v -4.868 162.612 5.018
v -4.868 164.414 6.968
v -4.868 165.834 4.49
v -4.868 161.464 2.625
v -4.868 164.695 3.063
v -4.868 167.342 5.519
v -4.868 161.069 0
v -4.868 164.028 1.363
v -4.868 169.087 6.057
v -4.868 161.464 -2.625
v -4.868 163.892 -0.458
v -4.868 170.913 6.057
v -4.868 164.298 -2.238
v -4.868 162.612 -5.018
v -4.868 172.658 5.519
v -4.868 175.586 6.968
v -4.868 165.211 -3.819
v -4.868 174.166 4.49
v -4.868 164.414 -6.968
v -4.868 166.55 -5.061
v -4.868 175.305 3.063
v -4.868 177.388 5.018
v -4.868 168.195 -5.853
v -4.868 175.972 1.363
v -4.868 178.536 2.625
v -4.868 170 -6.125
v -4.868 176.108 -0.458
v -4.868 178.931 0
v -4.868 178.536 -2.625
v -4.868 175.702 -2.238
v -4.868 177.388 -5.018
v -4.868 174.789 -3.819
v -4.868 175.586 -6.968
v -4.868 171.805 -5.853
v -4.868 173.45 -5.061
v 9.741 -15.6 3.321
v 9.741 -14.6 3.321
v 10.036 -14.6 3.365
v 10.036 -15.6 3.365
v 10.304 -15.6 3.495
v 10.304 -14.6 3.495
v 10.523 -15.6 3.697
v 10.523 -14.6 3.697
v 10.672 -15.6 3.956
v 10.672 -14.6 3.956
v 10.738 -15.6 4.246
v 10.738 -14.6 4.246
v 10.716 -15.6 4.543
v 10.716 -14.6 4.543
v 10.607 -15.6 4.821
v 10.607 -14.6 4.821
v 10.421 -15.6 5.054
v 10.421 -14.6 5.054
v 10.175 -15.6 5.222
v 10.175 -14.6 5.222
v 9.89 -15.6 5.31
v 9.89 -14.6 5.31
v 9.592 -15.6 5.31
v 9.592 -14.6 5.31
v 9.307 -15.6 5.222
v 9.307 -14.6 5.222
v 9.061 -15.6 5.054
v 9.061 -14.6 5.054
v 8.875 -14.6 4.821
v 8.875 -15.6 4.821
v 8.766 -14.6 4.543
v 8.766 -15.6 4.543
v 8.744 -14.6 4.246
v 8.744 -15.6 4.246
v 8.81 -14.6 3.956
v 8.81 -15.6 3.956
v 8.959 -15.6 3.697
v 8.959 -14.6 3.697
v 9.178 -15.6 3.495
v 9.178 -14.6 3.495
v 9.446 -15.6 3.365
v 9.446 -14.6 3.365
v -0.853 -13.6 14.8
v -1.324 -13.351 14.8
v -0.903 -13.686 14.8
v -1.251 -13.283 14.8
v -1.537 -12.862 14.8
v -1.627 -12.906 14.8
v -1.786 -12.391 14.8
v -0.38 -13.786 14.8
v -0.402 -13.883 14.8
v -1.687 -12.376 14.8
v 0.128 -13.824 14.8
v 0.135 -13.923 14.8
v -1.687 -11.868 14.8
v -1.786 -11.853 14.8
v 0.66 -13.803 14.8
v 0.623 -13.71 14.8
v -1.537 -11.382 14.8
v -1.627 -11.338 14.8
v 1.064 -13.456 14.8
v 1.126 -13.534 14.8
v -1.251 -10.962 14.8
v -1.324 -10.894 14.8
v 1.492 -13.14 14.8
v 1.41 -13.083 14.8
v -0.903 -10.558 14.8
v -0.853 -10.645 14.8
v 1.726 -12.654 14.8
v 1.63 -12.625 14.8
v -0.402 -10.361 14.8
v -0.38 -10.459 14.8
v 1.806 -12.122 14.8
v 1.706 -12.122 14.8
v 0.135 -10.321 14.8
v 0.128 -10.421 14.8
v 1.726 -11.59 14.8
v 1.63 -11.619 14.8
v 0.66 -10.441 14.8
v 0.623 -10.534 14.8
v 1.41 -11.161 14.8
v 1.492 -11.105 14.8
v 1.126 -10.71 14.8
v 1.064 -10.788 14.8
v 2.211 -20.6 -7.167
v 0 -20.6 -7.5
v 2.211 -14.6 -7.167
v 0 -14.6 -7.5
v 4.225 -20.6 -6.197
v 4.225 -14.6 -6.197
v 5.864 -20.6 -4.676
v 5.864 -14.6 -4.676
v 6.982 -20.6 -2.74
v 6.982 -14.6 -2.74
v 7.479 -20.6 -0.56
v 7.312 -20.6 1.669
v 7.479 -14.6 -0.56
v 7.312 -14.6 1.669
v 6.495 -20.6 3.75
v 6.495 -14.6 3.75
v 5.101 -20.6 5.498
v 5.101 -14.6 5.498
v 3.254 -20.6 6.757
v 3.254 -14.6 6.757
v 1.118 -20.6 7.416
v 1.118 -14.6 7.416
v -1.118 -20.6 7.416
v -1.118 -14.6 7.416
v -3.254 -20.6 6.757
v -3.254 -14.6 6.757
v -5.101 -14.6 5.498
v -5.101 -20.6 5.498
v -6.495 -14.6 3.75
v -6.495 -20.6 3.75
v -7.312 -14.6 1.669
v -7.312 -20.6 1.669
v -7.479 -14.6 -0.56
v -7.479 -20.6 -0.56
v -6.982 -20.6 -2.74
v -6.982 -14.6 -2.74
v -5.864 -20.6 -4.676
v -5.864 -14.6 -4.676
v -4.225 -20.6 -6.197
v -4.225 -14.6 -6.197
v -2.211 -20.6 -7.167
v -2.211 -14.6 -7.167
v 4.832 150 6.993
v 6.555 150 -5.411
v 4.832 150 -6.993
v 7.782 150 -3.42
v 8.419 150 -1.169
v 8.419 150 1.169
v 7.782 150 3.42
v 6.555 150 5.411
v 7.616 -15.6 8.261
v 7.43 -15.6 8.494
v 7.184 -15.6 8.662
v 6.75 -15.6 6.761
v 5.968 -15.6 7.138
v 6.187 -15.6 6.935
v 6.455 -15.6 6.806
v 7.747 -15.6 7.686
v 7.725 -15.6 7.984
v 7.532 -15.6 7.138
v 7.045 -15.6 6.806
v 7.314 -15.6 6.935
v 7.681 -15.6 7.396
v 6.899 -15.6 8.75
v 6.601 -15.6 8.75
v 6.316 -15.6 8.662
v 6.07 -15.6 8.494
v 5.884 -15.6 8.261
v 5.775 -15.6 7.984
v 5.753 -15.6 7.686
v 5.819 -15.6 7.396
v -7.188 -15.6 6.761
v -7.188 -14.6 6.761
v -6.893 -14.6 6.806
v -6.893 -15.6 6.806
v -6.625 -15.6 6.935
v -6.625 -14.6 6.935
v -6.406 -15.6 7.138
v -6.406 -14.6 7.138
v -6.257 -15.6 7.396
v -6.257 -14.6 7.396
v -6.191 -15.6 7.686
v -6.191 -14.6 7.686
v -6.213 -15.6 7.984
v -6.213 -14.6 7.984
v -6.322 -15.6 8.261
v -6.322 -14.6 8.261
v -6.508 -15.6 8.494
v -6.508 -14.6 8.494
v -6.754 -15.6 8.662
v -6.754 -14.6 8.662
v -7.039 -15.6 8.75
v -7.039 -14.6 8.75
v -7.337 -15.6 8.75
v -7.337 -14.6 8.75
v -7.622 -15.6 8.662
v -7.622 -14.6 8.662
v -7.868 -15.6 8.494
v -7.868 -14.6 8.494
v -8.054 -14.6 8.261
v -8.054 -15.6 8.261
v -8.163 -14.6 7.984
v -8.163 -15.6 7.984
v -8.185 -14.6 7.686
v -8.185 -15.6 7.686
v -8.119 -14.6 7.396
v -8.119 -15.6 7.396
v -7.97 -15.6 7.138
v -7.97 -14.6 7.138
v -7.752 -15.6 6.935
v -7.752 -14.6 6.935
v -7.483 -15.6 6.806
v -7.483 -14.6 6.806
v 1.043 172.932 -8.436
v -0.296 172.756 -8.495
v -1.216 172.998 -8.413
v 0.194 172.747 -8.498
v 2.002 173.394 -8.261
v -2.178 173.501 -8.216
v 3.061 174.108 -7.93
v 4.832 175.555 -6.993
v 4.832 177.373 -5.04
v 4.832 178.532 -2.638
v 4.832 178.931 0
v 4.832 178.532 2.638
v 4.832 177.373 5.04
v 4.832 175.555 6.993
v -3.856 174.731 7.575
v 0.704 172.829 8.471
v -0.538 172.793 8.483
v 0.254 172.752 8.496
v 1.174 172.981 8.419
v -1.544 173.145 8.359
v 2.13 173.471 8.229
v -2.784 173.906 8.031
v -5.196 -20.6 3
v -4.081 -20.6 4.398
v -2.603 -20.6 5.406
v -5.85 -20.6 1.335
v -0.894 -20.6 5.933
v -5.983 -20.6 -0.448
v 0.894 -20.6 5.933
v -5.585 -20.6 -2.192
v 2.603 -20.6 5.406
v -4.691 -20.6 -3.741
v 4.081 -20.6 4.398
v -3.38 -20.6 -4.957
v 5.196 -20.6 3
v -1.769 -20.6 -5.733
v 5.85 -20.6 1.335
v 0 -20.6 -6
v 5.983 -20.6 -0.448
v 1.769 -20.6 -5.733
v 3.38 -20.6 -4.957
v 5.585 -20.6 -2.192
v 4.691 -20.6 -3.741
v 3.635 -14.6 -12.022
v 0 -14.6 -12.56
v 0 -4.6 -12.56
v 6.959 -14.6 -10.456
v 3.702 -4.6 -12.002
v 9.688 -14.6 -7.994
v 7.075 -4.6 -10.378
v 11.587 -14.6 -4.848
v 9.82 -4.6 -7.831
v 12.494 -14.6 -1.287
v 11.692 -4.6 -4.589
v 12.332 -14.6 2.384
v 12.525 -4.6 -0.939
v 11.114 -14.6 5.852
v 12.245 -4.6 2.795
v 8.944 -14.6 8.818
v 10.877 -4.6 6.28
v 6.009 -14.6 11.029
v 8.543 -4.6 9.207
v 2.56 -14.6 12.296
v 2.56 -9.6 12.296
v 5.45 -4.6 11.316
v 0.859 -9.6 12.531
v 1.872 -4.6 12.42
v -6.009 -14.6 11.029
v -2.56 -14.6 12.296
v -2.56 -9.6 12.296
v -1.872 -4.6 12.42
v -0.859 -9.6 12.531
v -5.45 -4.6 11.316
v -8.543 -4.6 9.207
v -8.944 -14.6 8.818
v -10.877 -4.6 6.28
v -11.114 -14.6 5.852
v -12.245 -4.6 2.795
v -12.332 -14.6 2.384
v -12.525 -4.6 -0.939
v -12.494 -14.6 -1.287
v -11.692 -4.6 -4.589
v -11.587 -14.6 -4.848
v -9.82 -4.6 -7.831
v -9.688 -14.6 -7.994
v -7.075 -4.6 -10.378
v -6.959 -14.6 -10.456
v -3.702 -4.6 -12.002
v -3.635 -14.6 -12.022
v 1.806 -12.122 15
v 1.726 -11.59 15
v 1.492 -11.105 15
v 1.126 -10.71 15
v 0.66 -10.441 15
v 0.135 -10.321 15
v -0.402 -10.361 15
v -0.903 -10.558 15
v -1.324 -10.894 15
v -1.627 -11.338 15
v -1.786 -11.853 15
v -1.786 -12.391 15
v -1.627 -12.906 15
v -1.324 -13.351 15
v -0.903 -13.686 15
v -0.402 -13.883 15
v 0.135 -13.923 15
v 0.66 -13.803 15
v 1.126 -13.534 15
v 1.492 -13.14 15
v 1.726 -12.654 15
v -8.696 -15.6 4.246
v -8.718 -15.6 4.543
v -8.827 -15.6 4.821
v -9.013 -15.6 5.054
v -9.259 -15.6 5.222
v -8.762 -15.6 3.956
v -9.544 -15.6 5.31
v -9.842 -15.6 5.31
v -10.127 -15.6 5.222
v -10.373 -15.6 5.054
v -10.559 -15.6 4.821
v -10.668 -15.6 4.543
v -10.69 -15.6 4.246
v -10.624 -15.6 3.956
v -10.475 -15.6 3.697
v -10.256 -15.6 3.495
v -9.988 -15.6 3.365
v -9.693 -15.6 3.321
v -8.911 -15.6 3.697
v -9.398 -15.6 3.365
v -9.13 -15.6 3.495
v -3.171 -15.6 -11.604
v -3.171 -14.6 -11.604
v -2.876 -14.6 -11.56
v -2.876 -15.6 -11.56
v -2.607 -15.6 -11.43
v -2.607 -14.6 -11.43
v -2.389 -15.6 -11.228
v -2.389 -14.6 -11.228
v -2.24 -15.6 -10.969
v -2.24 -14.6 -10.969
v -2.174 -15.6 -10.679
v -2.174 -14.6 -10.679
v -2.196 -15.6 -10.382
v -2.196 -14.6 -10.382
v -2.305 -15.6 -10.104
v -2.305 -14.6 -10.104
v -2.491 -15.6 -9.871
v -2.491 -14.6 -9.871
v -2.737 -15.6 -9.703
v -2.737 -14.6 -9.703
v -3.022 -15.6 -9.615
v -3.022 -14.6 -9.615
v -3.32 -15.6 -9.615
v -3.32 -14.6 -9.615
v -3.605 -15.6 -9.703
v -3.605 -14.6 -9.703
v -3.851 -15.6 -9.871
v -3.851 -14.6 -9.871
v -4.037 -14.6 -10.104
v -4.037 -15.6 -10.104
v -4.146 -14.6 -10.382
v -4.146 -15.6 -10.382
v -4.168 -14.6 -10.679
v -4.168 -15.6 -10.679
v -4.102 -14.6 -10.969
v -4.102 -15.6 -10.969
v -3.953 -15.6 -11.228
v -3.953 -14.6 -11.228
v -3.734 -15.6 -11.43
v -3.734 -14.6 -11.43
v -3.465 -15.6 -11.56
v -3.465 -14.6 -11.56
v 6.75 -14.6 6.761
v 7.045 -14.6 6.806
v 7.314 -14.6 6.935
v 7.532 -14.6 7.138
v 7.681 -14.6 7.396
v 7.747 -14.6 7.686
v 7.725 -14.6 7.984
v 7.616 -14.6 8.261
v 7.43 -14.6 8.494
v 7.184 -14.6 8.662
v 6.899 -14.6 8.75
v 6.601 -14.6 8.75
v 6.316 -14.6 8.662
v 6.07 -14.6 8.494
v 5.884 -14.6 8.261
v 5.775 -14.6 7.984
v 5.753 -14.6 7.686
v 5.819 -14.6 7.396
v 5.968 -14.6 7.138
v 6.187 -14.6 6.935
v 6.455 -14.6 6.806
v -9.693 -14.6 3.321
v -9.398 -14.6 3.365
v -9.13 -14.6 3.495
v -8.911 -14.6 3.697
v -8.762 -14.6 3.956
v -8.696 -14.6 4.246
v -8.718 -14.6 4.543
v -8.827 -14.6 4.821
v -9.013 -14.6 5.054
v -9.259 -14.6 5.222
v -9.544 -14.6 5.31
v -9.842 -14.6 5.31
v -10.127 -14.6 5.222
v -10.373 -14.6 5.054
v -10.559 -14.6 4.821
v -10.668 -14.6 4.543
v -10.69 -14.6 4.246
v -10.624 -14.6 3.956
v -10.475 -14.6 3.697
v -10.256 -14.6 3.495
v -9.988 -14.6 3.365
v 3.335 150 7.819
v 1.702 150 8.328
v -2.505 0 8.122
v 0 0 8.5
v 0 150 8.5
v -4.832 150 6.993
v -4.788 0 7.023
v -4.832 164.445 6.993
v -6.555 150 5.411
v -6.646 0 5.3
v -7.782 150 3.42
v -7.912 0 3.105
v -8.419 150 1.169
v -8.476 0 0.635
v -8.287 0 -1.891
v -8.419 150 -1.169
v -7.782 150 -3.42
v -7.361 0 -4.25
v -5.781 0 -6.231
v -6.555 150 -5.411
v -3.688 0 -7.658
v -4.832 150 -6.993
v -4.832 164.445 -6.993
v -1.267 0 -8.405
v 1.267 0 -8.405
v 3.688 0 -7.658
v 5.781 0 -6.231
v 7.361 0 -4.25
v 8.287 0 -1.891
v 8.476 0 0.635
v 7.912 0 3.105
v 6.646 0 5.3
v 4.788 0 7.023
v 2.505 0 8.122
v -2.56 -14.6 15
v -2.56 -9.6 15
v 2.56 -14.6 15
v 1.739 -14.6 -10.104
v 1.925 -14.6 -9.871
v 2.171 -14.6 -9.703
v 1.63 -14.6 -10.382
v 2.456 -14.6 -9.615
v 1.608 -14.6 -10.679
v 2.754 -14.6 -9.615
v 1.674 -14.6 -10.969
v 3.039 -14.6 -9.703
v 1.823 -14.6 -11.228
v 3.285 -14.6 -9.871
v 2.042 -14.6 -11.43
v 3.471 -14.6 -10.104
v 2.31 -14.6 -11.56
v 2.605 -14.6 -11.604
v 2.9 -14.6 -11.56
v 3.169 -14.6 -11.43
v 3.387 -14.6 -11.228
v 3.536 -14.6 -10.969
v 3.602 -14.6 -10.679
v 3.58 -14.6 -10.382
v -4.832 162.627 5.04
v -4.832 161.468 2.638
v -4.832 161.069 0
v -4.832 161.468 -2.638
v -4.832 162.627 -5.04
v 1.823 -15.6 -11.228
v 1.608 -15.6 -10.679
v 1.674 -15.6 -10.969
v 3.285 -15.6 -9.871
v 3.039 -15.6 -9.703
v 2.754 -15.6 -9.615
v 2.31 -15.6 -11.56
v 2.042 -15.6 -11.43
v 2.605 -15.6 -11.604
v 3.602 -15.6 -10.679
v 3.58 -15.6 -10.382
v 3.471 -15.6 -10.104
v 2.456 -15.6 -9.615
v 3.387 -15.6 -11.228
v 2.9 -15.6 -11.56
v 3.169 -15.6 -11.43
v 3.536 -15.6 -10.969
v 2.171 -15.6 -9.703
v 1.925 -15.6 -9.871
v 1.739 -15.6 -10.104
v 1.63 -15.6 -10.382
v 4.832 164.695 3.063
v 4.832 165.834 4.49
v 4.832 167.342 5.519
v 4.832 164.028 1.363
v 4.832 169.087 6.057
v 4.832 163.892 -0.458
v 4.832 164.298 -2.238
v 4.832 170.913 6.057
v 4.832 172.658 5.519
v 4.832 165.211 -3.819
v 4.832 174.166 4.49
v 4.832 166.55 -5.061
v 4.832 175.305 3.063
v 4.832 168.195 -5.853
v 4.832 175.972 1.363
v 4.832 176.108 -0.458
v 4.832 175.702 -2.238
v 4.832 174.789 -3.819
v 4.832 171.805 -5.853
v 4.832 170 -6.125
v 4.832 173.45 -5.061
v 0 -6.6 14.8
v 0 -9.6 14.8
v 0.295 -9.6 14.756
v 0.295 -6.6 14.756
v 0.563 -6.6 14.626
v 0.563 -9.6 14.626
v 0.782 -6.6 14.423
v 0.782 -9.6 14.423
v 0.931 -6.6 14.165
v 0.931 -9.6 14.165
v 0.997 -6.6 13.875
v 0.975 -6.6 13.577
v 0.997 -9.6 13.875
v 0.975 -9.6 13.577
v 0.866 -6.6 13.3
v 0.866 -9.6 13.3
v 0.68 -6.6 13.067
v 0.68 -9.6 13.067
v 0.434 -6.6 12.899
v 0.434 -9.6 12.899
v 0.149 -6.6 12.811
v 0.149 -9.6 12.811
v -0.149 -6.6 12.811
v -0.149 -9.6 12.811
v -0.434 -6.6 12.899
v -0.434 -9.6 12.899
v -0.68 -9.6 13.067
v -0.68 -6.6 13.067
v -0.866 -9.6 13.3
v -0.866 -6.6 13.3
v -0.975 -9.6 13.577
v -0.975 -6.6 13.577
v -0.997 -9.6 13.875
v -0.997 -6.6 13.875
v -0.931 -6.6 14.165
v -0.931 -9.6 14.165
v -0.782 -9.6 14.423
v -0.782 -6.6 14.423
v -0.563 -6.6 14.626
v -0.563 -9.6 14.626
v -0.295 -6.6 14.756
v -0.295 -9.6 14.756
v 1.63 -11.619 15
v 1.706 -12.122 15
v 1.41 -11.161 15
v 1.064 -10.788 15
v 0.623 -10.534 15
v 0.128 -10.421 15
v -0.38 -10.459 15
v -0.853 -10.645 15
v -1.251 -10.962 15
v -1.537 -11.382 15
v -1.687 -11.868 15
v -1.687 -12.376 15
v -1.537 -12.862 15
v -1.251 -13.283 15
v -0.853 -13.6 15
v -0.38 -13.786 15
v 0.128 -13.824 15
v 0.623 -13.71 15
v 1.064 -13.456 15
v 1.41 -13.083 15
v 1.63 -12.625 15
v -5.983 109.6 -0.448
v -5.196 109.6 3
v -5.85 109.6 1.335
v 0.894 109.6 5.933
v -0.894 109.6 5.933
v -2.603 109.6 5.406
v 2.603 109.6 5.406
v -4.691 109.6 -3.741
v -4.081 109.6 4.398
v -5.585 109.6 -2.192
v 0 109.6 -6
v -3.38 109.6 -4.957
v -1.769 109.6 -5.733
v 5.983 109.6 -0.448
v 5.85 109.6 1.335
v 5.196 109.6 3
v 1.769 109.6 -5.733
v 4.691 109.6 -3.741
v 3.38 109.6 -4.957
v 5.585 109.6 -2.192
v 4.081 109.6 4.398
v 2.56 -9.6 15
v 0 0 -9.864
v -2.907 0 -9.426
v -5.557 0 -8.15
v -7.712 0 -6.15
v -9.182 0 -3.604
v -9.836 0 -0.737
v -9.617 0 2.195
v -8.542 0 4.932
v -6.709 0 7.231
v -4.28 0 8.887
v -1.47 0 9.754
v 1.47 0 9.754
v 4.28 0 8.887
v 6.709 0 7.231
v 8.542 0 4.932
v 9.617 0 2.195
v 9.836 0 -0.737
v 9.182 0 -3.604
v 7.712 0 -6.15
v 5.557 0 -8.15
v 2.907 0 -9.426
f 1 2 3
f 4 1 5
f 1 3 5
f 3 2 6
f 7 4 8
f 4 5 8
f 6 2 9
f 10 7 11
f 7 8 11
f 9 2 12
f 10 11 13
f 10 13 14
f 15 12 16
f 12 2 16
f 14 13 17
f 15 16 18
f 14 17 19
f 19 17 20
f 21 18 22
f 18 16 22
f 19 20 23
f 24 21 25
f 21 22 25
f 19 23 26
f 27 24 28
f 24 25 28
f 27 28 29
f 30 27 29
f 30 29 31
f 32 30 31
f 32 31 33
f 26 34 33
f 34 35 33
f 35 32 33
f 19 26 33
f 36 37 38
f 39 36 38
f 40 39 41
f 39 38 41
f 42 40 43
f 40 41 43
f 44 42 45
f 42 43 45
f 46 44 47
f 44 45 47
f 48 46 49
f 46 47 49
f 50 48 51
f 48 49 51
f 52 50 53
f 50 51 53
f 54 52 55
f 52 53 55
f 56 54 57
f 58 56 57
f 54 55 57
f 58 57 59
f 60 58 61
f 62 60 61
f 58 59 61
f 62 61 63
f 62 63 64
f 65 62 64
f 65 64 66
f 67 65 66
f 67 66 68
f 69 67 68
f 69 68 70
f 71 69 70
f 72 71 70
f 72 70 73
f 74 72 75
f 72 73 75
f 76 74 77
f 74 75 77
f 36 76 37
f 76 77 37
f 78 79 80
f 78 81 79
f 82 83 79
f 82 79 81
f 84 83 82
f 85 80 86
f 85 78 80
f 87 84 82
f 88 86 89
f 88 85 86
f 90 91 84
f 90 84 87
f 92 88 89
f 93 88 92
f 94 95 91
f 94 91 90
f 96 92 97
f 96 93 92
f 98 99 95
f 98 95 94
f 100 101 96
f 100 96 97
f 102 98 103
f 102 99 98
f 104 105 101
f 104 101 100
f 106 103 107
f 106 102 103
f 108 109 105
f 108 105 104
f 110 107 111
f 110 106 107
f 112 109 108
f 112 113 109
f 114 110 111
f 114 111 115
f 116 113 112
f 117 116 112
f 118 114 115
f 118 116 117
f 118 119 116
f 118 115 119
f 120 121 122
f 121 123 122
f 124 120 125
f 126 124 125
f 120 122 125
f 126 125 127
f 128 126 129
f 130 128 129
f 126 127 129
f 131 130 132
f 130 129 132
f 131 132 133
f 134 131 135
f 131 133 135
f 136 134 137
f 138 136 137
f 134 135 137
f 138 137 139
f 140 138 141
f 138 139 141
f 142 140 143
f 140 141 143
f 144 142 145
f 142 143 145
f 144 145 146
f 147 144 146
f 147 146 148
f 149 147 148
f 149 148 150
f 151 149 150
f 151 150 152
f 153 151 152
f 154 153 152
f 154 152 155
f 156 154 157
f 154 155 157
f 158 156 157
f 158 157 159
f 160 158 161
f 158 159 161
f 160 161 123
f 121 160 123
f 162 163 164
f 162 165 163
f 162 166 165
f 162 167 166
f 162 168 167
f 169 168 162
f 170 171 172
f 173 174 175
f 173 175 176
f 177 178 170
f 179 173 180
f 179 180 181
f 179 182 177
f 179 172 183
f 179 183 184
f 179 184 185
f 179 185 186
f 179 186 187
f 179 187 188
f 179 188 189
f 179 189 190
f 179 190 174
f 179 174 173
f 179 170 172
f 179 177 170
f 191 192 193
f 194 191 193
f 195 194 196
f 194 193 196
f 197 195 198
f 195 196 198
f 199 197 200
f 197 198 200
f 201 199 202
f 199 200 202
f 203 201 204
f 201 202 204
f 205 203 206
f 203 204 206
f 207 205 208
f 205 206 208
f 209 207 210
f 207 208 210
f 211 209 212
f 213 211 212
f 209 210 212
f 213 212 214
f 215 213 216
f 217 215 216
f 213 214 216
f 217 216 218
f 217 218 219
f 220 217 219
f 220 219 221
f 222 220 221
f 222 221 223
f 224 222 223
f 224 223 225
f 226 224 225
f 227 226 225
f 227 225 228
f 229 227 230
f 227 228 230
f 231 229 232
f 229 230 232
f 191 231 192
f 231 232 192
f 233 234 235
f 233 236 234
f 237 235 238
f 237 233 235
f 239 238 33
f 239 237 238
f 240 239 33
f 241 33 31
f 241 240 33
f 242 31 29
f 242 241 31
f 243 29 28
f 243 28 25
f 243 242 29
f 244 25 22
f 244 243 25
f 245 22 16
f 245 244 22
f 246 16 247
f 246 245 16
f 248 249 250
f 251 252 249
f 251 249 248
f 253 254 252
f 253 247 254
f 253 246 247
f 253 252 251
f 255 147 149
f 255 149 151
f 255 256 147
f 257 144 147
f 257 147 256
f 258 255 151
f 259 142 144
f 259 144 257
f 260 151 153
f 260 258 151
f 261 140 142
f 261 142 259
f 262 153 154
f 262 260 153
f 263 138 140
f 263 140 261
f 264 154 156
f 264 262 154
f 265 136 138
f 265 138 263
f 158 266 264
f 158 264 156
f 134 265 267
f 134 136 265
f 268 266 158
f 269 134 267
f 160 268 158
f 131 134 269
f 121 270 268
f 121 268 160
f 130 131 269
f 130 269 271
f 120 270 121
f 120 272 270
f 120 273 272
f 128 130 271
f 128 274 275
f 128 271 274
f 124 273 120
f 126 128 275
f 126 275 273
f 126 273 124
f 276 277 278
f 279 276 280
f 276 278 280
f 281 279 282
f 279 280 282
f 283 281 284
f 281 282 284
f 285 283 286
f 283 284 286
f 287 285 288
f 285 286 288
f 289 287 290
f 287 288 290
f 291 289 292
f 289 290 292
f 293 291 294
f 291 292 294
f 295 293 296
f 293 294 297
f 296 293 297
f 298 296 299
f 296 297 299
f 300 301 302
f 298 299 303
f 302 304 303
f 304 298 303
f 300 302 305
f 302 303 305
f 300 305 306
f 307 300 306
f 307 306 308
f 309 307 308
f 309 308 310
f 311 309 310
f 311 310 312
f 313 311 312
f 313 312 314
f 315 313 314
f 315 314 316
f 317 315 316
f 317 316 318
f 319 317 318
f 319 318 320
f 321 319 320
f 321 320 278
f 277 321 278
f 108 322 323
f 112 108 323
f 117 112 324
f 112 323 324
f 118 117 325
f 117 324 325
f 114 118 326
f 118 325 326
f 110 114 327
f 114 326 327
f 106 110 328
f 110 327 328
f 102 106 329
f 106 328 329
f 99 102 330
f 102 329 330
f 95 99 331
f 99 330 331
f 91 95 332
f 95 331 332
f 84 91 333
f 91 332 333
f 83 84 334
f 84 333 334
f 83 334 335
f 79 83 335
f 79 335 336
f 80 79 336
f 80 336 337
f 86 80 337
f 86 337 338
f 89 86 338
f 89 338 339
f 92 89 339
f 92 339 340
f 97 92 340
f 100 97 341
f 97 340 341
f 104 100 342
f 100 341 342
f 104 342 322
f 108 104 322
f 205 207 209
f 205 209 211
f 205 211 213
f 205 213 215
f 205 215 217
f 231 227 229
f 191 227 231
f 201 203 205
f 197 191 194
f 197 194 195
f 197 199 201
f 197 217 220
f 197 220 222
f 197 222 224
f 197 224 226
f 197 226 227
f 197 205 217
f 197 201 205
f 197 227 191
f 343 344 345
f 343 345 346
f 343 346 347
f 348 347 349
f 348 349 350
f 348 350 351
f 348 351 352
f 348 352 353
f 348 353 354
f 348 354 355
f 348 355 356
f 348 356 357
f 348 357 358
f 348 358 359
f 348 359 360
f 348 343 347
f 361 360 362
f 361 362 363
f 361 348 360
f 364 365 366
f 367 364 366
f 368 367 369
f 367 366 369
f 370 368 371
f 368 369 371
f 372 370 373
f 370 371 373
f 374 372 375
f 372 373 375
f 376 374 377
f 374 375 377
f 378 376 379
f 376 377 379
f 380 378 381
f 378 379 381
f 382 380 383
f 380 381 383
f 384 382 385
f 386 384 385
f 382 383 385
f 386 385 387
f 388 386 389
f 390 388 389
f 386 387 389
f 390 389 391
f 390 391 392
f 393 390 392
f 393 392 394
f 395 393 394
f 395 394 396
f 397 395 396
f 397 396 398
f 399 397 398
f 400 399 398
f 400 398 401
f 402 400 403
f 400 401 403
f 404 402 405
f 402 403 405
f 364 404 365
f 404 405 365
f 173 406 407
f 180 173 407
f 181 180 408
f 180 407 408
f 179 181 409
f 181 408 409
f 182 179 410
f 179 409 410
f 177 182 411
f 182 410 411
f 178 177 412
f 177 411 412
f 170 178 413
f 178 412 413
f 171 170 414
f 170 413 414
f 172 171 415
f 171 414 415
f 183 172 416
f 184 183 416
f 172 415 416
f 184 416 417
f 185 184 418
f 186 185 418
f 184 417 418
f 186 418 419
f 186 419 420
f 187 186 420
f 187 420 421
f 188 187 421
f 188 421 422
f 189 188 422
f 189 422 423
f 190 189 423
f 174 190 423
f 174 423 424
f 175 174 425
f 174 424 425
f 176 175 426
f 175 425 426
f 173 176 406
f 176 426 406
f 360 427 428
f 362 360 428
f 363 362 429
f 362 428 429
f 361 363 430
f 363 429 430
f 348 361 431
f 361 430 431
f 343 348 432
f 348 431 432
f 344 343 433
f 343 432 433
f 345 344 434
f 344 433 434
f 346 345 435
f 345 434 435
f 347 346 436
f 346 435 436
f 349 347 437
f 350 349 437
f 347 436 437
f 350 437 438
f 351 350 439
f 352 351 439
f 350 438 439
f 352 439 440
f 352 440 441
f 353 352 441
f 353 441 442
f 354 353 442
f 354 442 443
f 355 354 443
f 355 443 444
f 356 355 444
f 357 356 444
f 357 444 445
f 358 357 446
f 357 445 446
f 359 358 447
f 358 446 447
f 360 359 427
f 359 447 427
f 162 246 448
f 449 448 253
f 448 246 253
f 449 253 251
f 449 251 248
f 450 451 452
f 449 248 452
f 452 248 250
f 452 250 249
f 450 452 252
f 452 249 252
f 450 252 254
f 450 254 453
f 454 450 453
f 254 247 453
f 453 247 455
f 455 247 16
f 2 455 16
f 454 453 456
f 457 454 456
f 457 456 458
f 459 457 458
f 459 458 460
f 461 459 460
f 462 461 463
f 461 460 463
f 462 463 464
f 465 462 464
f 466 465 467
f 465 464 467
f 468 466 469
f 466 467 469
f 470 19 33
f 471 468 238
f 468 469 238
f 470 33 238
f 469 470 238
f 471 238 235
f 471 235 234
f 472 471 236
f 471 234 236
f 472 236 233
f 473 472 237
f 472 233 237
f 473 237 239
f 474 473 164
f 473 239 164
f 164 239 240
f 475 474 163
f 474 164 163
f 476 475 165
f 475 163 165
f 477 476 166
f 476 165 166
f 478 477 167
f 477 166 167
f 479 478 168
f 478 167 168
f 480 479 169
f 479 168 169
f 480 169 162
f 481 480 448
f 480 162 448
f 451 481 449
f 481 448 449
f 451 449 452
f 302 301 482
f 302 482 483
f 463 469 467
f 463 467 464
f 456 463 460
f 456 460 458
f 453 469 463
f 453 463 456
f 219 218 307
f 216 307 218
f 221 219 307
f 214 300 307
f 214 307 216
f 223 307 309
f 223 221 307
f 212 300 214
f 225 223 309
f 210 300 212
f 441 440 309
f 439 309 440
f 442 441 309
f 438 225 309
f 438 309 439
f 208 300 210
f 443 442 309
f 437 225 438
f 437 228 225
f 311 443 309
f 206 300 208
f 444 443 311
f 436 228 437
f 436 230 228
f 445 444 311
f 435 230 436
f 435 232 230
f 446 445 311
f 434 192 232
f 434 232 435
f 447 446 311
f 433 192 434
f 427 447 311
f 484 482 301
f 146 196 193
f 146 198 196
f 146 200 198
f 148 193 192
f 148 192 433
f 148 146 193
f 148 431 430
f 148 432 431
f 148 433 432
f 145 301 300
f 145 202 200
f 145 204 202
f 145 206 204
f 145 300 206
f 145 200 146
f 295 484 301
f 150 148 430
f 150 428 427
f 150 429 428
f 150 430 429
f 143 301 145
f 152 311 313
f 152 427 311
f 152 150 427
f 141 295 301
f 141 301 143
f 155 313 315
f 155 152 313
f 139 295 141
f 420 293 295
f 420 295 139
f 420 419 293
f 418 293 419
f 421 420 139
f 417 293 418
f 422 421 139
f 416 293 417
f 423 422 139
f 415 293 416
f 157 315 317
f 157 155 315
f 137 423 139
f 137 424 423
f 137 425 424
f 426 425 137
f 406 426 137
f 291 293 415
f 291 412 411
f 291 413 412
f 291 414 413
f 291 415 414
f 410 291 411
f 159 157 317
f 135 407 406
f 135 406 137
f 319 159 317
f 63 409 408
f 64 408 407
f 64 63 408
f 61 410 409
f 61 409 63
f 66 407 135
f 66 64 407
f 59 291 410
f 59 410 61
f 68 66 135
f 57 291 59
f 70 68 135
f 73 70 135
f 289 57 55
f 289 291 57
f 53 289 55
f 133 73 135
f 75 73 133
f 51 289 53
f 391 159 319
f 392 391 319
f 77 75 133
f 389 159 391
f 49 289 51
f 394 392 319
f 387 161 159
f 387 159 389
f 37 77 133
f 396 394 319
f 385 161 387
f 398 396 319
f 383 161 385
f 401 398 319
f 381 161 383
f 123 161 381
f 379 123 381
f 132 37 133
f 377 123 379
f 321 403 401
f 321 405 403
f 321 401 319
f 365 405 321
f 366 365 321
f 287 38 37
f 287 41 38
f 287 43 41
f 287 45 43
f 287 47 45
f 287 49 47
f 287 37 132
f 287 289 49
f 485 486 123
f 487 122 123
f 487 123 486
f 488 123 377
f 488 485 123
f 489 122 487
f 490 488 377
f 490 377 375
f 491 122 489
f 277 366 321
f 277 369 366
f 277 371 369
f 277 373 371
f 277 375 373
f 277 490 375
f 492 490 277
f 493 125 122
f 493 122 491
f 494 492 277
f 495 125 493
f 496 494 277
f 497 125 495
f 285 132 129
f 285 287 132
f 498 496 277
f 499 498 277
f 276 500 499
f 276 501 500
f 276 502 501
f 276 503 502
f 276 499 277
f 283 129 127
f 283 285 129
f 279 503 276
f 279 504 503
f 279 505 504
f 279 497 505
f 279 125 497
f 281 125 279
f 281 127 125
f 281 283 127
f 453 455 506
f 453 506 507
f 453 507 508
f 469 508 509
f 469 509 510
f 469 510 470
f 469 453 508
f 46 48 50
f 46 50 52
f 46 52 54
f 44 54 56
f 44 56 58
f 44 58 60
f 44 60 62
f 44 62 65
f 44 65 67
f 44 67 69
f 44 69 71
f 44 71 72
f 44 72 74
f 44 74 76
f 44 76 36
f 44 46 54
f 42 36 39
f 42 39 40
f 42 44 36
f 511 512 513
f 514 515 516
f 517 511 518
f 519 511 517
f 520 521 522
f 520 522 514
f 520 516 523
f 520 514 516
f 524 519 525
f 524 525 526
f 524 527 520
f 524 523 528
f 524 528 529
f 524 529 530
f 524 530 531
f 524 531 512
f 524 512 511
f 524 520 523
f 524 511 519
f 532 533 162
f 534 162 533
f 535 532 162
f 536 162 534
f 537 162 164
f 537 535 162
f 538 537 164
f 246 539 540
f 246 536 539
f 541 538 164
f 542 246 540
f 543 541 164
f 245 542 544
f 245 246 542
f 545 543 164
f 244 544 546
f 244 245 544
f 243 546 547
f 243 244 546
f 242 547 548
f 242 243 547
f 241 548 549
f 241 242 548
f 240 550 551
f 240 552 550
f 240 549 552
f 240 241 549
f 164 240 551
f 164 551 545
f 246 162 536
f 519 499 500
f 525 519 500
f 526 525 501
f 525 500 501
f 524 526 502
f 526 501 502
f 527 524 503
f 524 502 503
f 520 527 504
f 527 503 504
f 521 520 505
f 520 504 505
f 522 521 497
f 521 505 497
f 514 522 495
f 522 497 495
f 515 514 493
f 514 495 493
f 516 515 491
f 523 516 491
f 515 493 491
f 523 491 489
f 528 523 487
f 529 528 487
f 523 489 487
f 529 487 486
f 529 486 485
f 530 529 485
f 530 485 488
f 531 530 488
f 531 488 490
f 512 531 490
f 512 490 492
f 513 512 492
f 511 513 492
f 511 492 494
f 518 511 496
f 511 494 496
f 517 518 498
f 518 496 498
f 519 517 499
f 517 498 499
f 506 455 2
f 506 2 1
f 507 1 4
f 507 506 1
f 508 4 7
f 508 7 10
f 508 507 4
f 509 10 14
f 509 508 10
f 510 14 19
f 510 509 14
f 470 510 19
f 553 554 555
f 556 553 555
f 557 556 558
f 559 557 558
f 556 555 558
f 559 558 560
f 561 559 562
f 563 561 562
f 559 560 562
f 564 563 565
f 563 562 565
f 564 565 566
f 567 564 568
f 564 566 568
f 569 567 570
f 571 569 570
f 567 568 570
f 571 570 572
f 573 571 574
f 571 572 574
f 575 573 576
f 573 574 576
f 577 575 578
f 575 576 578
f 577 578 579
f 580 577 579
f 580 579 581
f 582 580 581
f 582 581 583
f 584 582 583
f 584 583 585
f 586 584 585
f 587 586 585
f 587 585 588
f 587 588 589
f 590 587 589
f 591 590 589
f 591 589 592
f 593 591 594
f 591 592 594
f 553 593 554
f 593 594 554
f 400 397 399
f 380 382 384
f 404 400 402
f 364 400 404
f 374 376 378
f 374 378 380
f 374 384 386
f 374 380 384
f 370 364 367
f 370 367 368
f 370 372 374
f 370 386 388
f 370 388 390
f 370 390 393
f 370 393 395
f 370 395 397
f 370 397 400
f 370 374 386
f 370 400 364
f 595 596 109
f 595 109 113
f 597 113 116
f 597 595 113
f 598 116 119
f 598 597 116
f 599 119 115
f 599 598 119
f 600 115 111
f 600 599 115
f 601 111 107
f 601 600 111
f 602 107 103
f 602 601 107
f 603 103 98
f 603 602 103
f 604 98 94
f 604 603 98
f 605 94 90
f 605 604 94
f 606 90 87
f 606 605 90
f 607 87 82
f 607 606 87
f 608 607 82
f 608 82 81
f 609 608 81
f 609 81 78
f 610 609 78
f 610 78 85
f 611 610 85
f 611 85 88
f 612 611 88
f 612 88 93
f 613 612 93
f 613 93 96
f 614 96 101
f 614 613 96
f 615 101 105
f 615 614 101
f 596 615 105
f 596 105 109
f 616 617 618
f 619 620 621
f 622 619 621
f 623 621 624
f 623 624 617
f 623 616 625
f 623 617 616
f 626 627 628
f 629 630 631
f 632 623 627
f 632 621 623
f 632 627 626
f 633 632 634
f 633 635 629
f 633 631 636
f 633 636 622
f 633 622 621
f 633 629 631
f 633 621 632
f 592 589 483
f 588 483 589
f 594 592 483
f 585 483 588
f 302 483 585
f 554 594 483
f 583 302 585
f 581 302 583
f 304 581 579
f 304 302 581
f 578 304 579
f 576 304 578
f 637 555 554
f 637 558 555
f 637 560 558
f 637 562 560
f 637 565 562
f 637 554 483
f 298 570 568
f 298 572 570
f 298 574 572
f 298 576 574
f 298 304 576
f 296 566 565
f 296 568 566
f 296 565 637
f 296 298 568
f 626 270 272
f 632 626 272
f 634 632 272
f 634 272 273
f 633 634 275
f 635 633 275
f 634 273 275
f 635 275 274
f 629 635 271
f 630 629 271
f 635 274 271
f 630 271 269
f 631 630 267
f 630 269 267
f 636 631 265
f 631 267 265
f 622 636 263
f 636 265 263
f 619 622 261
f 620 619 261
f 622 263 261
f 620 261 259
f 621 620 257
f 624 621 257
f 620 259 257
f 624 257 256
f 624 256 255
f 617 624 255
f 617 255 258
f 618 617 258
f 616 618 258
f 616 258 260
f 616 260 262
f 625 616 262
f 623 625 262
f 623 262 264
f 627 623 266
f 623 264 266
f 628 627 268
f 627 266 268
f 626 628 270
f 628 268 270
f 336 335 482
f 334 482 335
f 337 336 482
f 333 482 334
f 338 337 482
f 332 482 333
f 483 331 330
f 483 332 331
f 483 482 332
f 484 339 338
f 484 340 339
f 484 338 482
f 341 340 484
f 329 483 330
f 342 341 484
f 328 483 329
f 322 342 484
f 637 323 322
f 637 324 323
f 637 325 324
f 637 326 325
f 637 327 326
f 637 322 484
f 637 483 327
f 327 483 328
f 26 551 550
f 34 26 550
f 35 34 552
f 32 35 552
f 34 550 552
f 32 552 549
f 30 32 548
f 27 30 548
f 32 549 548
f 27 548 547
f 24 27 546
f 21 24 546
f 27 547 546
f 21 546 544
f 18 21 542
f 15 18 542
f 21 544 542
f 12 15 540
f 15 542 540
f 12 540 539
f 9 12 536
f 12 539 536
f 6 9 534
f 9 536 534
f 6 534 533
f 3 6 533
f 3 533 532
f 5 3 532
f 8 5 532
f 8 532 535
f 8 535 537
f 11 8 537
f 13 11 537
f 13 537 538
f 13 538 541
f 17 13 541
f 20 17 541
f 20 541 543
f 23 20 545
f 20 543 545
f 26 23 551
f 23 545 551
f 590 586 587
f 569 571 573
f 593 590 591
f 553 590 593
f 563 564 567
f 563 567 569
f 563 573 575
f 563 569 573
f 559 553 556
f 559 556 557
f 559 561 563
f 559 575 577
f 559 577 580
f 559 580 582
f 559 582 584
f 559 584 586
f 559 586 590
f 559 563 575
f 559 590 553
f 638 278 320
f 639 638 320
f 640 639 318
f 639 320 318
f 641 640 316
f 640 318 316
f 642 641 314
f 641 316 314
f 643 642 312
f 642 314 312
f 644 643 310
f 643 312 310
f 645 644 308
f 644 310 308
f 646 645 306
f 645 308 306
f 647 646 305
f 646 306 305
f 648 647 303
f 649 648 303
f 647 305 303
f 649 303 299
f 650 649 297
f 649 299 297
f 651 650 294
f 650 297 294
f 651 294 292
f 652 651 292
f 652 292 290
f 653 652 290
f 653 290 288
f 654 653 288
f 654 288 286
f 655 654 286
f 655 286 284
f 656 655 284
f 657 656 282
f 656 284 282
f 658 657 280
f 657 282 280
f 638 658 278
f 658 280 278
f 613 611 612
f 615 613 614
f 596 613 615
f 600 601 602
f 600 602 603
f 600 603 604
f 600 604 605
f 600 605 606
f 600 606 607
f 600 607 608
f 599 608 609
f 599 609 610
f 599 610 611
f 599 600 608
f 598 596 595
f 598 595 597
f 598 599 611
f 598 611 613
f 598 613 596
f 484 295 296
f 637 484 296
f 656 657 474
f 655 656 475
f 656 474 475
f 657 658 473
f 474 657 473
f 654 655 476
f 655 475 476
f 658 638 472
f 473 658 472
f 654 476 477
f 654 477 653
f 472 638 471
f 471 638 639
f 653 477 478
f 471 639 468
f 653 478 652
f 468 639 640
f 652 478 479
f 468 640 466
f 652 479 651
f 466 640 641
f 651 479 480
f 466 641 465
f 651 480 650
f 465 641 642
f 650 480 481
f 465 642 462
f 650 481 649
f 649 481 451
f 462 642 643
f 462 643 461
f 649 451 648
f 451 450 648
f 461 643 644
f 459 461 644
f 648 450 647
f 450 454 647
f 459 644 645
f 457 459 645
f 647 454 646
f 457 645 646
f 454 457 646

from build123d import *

# Parameters (mm, degrees)
SKETCH_1_R               = 8.5
EXTRUDE_1_DEPTH          = 150
SKETCH_2_W               = 9.66465271
SKETCH_2_H               = 17.929973808
EXTRUDE_2_DEPTH          = 20
SKETCH_3_R               = 8.930825741
EXTRUDE_3_DEPTH          = 9.7
SKETCH_4_R               = 6.125222913
CUT_EXTRUDE_1_DEPTH      = 9.7
CUT_EXTRUDE_2_DEPTH      = 180.35679912
CUT_EXTRUDE_2_DEPTH_BACK = 180.35679912
SKETCH_5_R               = 18.5
SKETCH_5_R_2             = 8.5
SKETCH_10_R              = 12.560047034
EXTRUDE_5_DEPTH          = 10
SKETCH_11_R              = 7.5
SKETCH_11_R_2            = 1
EXTRUDE_6_DEPTH          = 1
SKETCH_12_R              = 7.5
EXTRUDE_7_DEPTH          = 5
EXTRUDE_8_DEPTH          = 2
EXTRUDE_8_DEPTH_BACK     = 1
SKETCH_13_W              = 5.120094068
SKETCH_13_H              = 5
SKETCH_14_R              = 1
EXTRUDE_9_DEPTH          = 3
SKETCH_15_R              = 1.806178817
SKETCH_15_R_2            = 1.706178817
CUT_EXTRUDE_3_DEPTH      = 0.2
SKETCH_16_R              = 6
CUT_EXTRUDE_2_2_DEPTH    = 130.2


with BuildPart() as part:
    # 草圖1 → 填料-伸長1 (new body)
    with BuildSketch(Plane(origin=(0, 0, 0), x_dir=(1, 0, 0), z_dir=(0, 1, 0))):
        with Locations(Location((0, 0, 0), (0, 0, 270))):
            Circle(SKETCH_1_R)
    extrude(amount=EXTRUDE_1_DEPTH)

    # 草圖2 → 填料-伸長2 (add)
    with BuildSketch(Plane(origin=(0, 150, 0), x_dir=(1, 0, 0), z_dir=(0, 1, 0))):
        Rectangle(SKETCH_2_W, SKETCH_2_H)
    extrude(amount=EXTRUDE_2_DEPTH)

    # 草圖3 → 填料-伸長3 (add)
    with BuildSketch(Plane(origin=(4.832326355, 0, 0), x_dir=(0, 0, -1), z_dir=(1, 0, 0))):
        with Locations((0, 170)):
            Circle(SKETCH_3_R)
    extrude(amount=-EXTRUDE_3_DEPTH)

    # 草圖4 → 除料-伸長1 (cut)
    with BuildSketch(Plane(origin=(4.832326355, 0, 0), x_dir=(0, 0, -1), z_dir=(1, 0, 0))):
        with Locations((0, 170)):
            Circle(SKETCH_4_R)
    extrude(amount=-CUT_EXTRUDE_1_DEPTH, mode=Mode.SUBTRACT)

    # 草圖5 → Cut-Extrude 2 (cut, two sides: drawn at the far end of the back side and taken through both)
    with BuildSketch(Plane.XZ.offset(-CUT_EXTRUDE_2_DEPTH_BACK)):
        Circle(SKETCH_5_R)
        Circle(SKETCH_5_R_2, mode=Mode.SUBTRACT)
    extrude(amount=CUT_EXTRUDE_2_DEPTH + CUT_EXTRUDE_2_DEPTH_BACK, mode=Mode.SUBTRACT)

    # 草圖9 → 旋轉3 (revolve)
    with BuildSketch(Plane(origin=(0, 0, 0), x_dir=(0, 0, -1), z_dir=(1, 0, 0)), mode=Mode.PRIVATE) as revolve_3_sk:
        Polygon((0, 0), (-9.863847944, 0), (-12.560047034, -4.59966966), (0, -4.59966966), align=None)
    revolve(revolve_3_sk.sketch.rotate(Axis((0, -4.59966966, 0), (0, 1, 0)), 180), axis=Axis((0, -4.59966966, 0), (0, 1, 0)))

    # 草圖10 → 填料-伸長5 (add)
    with BuildSketch(Plane.XZ.offset(4.59966966)):
        with Locations(Location((0, 0, 0), (0, 0, 270))):
            Circle(SKETCH_10_R)
    extrude(amount=EXTRUDE_5_DEPTH)

    # 草圖11 → 填料-伸長6 (add)
    with BuildSketch(Plane.XZ.offset(14.59966966)):
        with Locations(Location((0, 0, 0), (0, 0, 270))):
            Circle(SKETCH_11_R)
        with Locations(Location((-7.188213253, 7.761132083, 0), (0, 0, 270))):
            Circle(SKETCH_11_R_2)
        with Locations(Location((-9.69284226, 4.320867156, 0), (0, 0, 270))):
            Circle(SKETCH_11_R_2)
        with Locations(Location((6.750188429, 7.761132083, 0), (0, 0, 270))):
            Circle(SKETCH_11_R_2)
        with Locations(Location((9.740976841, 4.320867156, 0), (0, 0, 270))):
            Circle(SKETCH_11_R_2)
        with Locations(Location((-3.170732664, -10.604081457, 0), (0, 0, 270))):
            Circle(SKETCH_11_R_2)
        with Locations(Location((2.605242012, -10.604081457, 0), (0, 0, 270))):
            Circle(SKETCH_11_R_2)
    extrude(amount=EXTRUDE_6_DEPTH)

    # 草圖12 → 填料-伸長7 (add)
    with BuildSketch(Plane.XZ.offset(15.59966966)):
        with Locations(Location((0, 0, 0), (0, 0, 270))):
            Circle(SKETCH_12_R)
    extrude(amount=EXTRUDE_7_DEPTH)

    # 草圖13 → 填料-伸長8 (add, two sides: drawn at the far end of the back side and taken through both)
    with BuildSketch(Plane.XY.offset(13).offset(-EXTRUDE_8_DEPTH_BACK)):
        with Locations((0, -12.09966966)):
            Rectangle(SKETCH_13_W, SKETCH_13_H)
    extrude(amount=EXTRUDE_8_DEPTH + EXTRUDE_8_DEPTH_BACK)

    # 草圖14 → 填料-伸長9 (add)
    with BuildSketch(Plane(origin=(0, -9.59966966, 0), x_dir=(1, 0, 0), z_dir=(0, 1, 0))):
        with Locations(Location((0, -13.8, 0), (0, 0, 270))):
            Circle(SKETCH_14_R)
    extrude(amount=EXTRUDE_9_DEPTH)

    # 草圖15 → 除料-伸長-薄件3 (cut)
    with BuildSketch(Plane.XY.offset(15)):
        with Locations((0, -12.122115246)):
            Circle(SKETCH_15_R)
        with Locations((0, -12.122115246)):
            Circle(SKETCH_15_R_2, mode=Mode.SUBTRACT)
    extrude(amount=-CUT_EXTRUDE_3_DEPTH, mode=Mode.SUBTRACT)

    # 草圖16 → Cut-Extrude 2 2 (cut)
    with BuildSketch(Plane.XZ.offset(20.59966966)):
        with Locations(Location((0, 0, 0), (0, 0, 270))):
            Circle(SKETCH_16_R)
    extrude(amount=-CUT_EXTRUDE_2_2_DEPTH, mode=Mode.SUBTRACT)


solid = part.part
